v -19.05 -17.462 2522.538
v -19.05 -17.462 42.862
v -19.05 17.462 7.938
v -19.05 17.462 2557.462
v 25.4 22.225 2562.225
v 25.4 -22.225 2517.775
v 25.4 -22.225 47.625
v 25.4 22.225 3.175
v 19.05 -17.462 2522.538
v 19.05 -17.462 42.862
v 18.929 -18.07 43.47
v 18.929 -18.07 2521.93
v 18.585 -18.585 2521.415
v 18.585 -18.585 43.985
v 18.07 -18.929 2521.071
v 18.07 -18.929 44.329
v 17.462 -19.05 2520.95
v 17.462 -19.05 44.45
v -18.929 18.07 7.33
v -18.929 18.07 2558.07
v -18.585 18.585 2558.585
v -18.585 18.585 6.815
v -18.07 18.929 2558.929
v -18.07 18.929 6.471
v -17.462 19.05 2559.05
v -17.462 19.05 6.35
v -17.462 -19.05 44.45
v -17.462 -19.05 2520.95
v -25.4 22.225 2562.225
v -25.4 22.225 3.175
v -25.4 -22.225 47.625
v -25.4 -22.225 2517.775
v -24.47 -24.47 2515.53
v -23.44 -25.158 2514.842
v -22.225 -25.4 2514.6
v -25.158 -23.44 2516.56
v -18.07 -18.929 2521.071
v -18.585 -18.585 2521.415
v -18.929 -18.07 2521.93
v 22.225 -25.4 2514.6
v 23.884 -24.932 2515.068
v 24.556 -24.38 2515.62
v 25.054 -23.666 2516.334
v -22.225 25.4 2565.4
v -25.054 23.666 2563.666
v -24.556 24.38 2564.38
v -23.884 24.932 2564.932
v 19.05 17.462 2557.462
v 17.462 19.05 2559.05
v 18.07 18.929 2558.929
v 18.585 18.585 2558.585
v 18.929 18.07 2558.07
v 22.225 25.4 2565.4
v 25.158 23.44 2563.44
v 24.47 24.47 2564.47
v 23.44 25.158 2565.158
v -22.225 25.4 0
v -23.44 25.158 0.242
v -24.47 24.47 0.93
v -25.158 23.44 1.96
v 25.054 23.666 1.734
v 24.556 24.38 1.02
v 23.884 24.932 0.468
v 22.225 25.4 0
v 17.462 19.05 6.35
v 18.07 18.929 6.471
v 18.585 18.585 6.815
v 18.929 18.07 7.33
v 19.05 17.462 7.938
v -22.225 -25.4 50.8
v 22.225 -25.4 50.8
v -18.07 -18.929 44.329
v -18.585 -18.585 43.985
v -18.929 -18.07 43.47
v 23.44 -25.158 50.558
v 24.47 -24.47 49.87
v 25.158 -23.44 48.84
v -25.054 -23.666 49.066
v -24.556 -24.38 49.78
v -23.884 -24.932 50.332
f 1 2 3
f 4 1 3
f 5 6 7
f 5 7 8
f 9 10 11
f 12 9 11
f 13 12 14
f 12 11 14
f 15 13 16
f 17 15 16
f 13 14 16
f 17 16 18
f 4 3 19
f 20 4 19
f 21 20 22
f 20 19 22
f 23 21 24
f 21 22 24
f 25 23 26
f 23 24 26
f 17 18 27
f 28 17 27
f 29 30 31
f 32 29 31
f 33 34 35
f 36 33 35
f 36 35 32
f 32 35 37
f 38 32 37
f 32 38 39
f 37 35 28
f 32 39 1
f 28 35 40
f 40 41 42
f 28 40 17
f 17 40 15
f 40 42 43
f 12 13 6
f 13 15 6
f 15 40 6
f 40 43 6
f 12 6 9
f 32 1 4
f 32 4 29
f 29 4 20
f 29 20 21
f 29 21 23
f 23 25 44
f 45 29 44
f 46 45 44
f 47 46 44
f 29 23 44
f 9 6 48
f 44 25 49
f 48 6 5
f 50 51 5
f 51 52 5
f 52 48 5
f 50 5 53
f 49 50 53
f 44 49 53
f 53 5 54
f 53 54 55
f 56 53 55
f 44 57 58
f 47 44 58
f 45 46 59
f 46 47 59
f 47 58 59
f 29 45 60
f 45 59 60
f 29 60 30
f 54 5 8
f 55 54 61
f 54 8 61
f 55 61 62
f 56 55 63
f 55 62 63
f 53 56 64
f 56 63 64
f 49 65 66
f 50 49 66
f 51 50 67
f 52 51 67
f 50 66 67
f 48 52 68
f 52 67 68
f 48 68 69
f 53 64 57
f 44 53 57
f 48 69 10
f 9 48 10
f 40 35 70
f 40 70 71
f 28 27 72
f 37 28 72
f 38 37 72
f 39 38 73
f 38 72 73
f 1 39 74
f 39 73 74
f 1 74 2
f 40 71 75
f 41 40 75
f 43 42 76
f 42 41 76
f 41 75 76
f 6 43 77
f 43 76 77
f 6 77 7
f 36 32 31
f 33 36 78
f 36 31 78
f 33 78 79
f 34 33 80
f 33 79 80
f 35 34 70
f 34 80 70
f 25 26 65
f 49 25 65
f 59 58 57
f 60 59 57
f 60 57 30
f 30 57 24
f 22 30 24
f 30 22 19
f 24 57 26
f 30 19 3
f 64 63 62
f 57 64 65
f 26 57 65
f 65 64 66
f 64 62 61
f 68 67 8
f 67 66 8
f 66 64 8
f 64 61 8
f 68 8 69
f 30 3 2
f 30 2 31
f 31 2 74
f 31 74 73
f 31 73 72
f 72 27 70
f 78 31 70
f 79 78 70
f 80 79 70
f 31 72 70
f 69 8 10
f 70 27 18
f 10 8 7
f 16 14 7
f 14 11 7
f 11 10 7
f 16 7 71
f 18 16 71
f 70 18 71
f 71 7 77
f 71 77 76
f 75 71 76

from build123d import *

# Parameters (mm, degrees)
F1_DEPTH = 2565.4
F3_DEPTH = 50.801


with BuildPart() as f1:
    # F0 (on Top) → F1 (new body)
    with BuildSketch(Plane.XY):
        with BuildLine():
            Line((22.225, 25.4), (-22.225, 25.4))
            ThreePointArc((-22.225, 25.4), (-24.470064, 24.470064), (-25.4, 22.225))
            Line((-25.4, 22.225), (-25.4, -22.225))
            ThreePointArc((-25.4, -22.225), (-24.470064, -24.470064), (-22.225, -25.4))
            Line((-22.225, -25.4), (22.225, -25.4))
            ThreePointArc((22.225, -25.4), (24.470064, -24.470064), (25.4, -22.225))
            Line((25.4, -22.225), (25.4, 22.225))
            ThreePointArc((25.4, 22.225), (24.470064, 24.470064), (22.225, 25.4))
        make_face()
        with BuildLine():
            ThreePointArc((-19.05, 17.4625), (-18.585032, 18.585032), (-17.4625, 19.05))
            Line((-17.4625, 19.05), (17.4625, 19.05))
            ThreePointArc((17.4625, 19.05), (18.585032, 18.585032), (19.05, 17.4625))
            Line((19.05, 17.4625), (19.05, -17.4625))
            ThreePointArc((19.05, -17.4625), (18.585032, -18.585032), (17.4625, -19.05))
            Line((17.4625, -19.05), (-17.4625, -19.05))
            ThreePointArc((-17.4625, -19.05), (-18.585032, -18.585032), (-19.05, -17.4625))
            Line((-19.05, -17.4625), (-19.05, 17.4625))
        make_face(mode=Mode.SUBTRACT)
    extrude(amount=F1_DEPTH)

    # F2 (on face) → F3 (cut, through all)
    with BuildSketch(Plane.YZ.offset(25.4)):
        Polygon((-25.4, 2514.6), (25.4, 2565.4), (-25.4, 2565.4), align=None)
        Polygon((-25.4, 0), (25.4, 0), (-25.4, 50.8), align=None)
    extrude(amount=-F3_DEPTH, mode=Mode.SUBTRACT)


solid = f1.part
